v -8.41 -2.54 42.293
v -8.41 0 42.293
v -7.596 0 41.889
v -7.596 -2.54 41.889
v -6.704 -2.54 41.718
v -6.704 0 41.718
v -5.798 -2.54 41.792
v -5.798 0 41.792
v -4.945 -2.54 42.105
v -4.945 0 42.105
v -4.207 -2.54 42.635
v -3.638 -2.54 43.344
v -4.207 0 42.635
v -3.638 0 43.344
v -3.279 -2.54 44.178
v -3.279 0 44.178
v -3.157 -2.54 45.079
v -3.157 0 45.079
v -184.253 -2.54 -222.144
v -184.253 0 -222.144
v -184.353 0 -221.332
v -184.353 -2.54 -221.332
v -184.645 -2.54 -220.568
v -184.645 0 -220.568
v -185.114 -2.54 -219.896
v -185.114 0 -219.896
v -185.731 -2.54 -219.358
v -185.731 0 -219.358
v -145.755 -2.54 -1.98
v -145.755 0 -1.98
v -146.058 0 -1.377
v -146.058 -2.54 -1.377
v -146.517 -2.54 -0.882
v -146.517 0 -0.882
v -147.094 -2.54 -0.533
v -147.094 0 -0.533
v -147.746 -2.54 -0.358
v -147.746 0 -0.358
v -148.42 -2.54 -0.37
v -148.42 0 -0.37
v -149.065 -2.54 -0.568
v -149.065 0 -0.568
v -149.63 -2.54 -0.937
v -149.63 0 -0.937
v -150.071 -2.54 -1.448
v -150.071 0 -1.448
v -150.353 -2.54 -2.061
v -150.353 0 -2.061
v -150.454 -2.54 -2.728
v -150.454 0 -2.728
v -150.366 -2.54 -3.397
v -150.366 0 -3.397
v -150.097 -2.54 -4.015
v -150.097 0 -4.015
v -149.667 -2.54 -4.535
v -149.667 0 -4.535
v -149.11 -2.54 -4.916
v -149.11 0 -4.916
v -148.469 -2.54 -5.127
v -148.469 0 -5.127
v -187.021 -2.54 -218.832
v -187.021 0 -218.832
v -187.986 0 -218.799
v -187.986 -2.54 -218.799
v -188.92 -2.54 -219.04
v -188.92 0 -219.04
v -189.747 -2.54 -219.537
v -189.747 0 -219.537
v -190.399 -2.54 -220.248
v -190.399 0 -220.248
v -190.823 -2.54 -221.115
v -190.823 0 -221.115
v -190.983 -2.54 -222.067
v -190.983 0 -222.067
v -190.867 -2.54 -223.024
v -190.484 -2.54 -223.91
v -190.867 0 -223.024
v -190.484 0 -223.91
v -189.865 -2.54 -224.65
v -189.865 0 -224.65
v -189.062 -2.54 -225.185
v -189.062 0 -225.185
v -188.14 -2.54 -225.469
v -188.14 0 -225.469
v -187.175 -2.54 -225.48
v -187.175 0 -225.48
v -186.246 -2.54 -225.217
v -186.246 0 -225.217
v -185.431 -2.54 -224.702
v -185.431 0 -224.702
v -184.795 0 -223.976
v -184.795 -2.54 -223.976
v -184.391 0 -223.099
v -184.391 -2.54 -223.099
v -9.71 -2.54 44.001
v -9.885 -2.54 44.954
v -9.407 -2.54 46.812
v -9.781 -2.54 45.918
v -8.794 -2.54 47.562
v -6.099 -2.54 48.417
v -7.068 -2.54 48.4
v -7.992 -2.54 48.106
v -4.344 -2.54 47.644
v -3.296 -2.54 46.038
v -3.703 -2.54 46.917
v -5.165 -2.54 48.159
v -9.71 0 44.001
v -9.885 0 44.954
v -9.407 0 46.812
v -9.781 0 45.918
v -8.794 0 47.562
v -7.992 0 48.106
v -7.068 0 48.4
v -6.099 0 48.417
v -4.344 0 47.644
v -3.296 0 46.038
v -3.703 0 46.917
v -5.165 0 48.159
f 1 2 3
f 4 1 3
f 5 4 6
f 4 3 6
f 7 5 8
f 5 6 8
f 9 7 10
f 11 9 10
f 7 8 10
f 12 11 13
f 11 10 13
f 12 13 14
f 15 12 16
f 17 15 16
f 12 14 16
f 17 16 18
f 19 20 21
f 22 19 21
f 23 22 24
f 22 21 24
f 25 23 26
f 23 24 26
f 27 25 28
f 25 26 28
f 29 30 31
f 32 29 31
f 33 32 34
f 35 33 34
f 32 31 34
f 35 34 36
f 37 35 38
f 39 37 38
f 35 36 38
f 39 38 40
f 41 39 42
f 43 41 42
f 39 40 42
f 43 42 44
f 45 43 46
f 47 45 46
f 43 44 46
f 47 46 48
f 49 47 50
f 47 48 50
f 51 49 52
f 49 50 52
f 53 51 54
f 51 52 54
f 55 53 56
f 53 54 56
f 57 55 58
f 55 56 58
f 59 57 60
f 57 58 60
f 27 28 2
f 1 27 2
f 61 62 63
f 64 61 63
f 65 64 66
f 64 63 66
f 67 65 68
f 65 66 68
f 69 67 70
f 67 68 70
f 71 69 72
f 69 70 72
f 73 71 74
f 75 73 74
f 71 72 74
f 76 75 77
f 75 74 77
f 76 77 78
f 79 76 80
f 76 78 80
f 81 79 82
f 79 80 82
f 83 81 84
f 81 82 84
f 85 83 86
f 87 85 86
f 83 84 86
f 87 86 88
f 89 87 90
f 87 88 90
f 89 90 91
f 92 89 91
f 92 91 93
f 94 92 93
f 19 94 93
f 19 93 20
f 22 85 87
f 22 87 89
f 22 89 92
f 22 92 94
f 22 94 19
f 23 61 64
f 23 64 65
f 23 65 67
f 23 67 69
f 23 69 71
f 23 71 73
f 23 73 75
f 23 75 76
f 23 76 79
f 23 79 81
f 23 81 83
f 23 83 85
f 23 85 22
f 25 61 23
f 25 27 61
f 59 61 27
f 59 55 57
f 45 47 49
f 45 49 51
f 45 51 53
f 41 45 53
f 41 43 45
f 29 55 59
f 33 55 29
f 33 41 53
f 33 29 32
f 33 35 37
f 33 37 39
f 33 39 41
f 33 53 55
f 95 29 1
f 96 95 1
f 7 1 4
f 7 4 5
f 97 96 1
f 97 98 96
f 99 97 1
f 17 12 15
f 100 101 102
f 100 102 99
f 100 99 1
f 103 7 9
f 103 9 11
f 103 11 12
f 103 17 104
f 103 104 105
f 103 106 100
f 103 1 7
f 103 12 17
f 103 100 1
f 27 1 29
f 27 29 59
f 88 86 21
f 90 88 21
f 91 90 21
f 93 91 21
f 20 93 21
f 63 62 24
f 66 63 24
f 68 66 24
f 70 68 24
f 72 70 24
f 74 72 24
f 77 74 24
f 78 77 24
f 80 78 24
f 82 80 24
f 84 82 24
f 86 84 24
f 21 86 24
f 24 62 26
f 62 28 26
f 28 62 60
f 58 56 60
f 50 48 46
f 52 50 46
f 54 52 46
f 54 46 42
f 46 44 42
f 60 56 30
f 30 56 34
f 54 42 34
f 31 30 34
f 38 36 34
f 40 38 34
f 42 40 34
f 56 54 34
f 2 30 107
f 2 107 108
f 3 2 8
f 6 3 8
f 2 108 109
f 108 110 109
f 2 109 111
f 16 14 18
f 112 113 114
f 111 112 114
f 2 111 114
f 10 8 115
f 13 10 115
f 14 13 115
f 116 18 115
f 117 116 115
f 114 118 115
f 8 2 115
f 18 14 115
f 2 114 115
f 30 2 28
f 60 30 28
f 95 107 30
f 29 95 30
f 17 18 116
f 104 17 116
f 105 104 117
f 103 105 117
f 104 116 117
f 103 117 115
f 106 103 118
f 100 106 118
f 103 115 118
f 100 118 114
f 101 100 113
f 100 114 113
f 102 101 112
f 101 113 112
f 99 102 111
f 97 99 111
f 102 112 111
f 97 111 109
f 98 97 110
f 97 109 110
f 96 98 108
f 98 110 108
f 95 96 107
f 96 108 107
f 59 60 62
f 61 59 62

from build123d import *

# Parameters (mm, degrees)
F1_DEPTH = 2.54


with BuildPart() as f1:
    # F0 (on Front) → F1 (new body)
    with BuildSketch(Plane.XZ):
        with BuildLine():
            ThreePointArc((-145.7550496822, -1.980112821), (-145.6599833362, -2.3612365902), (-145.6280121514, -2.752734714))
            ThreePointArc((-145.6280121514, -2.752734714), (-146.4936146234, -4.6042556807), (-148.4693962296, -5.1274043924))
            Line((-148.4693962296, -5.1274043924), (-187.0211775011, -218.8322330784))
            ThreePointArc((-187.0211775011, -218.8322330784), (-186.3483570952, -219.0277166776), (-185.7305923943, -219.3582736479))
            Line((-185.7305923943, -219.3582736479), (-8.4100794876, 42.2926197897))
            ThreePointArc((-8.4100794876, 42.2926197897), (-9.2000837984, 43.0403550137), (-9.7103273998, 44.0010142893))
            Line((-9.7103273998, 44.0010142893), (-145.7550496822, -1.980112821))
        make_face()
        with BuildLine():
            ThreePointArc((-3.1565113243, 45.0786185085), (-7.0680481812, 48.3995271192), (-9.7103273998, 44.0010142893))
            Line((-9.7103273998, 44.0010142893), (-6.5220113243, 45.0786185085))
            Line((-6.5220113243, 45.0786185085), (-8.4100794876, 42.2926197897))
            ThreePointArc((-8.4100794876, 42.2926197897), (-4.9452588316, 42.1053304587), (-3.1565113243, 45.0786185085))
        make_face()
        with BuildLine():
            Line((-6.5220113243, 45.0786185085), (-9.7103273998, 44.0010142893))
            ThreePointArc((-9.7103273998, 44.0010142893), (-9.2000837984, 43.0403550137), (-8.4100794876, 42.2926197897))
            Line((-8.4100794876, 42.2926197897), (-6.5220113243, 45.0786185085))
        make_face()
        with BuildLine():
            ThreePointArc((-148.4693962296, -5.1274043924), (-146.4936146234, -4.6042556807), (-145.6280121514, -2.752734714))
            ThreePointArc((-145.6280121514, -2.752734714), (-145.6599833362, -2.3612365902), (-145.7550496822, -1.980112821))
            Line((-145.7550496822, -1.980112821), (-148.0410121514, -2.752734714))
            Line((-148.0410121514, -2.752734714), (-148.4693962296, -5.1274043924))
        make_face()
        with BuildLine():
            Line((-148.0410121514, -2.752734714), (-145.7550496822, -1.980112821))
            ThreePointArc((-145.7550496822, -1.980112821), (-149.8683080849, -1.1768036966), (-148.4693962296, -5.1274043924))
            Line((-148.4693962296, -5.1274043924), (-148.0410121514, -2.752734714))
        make_face()
        with BuildLine():
            Line((-187.6186605575, -222.1442723667), (-187.0211775011, -218.8322330784))
            ThreePointArc((-187.0211775011, -218.8322330784), (-190.2010450638, -224.3024847084), (-184.2531605575, -222.1442723667))
            ThreePointArc((-184.2531605575, -222.1442723667), (-184.6453725078, -220.567519874), (-185.7305923943, -219.3582736479))
            Line((-185.7305923943, -219.3582736479), (-187.6186605575, -222.1442723667))
        make_face()
        with BuildLine():
            ThreePointArc((-185.7305923943, -219.3582736479), (-186.3483570952, -219.0277166776), (-187.0211775011, -218.8322330784))
            Line((-187.0211775011, -218.8322330784), (-187.6186605575, -222.1442723667))
            Line((-187.6186605575, -222.1442723667), (-185.7305923943, -219.3582736479))
        make_face()
    extrude(amount=F1_DEPTH)


solid = f1.part
